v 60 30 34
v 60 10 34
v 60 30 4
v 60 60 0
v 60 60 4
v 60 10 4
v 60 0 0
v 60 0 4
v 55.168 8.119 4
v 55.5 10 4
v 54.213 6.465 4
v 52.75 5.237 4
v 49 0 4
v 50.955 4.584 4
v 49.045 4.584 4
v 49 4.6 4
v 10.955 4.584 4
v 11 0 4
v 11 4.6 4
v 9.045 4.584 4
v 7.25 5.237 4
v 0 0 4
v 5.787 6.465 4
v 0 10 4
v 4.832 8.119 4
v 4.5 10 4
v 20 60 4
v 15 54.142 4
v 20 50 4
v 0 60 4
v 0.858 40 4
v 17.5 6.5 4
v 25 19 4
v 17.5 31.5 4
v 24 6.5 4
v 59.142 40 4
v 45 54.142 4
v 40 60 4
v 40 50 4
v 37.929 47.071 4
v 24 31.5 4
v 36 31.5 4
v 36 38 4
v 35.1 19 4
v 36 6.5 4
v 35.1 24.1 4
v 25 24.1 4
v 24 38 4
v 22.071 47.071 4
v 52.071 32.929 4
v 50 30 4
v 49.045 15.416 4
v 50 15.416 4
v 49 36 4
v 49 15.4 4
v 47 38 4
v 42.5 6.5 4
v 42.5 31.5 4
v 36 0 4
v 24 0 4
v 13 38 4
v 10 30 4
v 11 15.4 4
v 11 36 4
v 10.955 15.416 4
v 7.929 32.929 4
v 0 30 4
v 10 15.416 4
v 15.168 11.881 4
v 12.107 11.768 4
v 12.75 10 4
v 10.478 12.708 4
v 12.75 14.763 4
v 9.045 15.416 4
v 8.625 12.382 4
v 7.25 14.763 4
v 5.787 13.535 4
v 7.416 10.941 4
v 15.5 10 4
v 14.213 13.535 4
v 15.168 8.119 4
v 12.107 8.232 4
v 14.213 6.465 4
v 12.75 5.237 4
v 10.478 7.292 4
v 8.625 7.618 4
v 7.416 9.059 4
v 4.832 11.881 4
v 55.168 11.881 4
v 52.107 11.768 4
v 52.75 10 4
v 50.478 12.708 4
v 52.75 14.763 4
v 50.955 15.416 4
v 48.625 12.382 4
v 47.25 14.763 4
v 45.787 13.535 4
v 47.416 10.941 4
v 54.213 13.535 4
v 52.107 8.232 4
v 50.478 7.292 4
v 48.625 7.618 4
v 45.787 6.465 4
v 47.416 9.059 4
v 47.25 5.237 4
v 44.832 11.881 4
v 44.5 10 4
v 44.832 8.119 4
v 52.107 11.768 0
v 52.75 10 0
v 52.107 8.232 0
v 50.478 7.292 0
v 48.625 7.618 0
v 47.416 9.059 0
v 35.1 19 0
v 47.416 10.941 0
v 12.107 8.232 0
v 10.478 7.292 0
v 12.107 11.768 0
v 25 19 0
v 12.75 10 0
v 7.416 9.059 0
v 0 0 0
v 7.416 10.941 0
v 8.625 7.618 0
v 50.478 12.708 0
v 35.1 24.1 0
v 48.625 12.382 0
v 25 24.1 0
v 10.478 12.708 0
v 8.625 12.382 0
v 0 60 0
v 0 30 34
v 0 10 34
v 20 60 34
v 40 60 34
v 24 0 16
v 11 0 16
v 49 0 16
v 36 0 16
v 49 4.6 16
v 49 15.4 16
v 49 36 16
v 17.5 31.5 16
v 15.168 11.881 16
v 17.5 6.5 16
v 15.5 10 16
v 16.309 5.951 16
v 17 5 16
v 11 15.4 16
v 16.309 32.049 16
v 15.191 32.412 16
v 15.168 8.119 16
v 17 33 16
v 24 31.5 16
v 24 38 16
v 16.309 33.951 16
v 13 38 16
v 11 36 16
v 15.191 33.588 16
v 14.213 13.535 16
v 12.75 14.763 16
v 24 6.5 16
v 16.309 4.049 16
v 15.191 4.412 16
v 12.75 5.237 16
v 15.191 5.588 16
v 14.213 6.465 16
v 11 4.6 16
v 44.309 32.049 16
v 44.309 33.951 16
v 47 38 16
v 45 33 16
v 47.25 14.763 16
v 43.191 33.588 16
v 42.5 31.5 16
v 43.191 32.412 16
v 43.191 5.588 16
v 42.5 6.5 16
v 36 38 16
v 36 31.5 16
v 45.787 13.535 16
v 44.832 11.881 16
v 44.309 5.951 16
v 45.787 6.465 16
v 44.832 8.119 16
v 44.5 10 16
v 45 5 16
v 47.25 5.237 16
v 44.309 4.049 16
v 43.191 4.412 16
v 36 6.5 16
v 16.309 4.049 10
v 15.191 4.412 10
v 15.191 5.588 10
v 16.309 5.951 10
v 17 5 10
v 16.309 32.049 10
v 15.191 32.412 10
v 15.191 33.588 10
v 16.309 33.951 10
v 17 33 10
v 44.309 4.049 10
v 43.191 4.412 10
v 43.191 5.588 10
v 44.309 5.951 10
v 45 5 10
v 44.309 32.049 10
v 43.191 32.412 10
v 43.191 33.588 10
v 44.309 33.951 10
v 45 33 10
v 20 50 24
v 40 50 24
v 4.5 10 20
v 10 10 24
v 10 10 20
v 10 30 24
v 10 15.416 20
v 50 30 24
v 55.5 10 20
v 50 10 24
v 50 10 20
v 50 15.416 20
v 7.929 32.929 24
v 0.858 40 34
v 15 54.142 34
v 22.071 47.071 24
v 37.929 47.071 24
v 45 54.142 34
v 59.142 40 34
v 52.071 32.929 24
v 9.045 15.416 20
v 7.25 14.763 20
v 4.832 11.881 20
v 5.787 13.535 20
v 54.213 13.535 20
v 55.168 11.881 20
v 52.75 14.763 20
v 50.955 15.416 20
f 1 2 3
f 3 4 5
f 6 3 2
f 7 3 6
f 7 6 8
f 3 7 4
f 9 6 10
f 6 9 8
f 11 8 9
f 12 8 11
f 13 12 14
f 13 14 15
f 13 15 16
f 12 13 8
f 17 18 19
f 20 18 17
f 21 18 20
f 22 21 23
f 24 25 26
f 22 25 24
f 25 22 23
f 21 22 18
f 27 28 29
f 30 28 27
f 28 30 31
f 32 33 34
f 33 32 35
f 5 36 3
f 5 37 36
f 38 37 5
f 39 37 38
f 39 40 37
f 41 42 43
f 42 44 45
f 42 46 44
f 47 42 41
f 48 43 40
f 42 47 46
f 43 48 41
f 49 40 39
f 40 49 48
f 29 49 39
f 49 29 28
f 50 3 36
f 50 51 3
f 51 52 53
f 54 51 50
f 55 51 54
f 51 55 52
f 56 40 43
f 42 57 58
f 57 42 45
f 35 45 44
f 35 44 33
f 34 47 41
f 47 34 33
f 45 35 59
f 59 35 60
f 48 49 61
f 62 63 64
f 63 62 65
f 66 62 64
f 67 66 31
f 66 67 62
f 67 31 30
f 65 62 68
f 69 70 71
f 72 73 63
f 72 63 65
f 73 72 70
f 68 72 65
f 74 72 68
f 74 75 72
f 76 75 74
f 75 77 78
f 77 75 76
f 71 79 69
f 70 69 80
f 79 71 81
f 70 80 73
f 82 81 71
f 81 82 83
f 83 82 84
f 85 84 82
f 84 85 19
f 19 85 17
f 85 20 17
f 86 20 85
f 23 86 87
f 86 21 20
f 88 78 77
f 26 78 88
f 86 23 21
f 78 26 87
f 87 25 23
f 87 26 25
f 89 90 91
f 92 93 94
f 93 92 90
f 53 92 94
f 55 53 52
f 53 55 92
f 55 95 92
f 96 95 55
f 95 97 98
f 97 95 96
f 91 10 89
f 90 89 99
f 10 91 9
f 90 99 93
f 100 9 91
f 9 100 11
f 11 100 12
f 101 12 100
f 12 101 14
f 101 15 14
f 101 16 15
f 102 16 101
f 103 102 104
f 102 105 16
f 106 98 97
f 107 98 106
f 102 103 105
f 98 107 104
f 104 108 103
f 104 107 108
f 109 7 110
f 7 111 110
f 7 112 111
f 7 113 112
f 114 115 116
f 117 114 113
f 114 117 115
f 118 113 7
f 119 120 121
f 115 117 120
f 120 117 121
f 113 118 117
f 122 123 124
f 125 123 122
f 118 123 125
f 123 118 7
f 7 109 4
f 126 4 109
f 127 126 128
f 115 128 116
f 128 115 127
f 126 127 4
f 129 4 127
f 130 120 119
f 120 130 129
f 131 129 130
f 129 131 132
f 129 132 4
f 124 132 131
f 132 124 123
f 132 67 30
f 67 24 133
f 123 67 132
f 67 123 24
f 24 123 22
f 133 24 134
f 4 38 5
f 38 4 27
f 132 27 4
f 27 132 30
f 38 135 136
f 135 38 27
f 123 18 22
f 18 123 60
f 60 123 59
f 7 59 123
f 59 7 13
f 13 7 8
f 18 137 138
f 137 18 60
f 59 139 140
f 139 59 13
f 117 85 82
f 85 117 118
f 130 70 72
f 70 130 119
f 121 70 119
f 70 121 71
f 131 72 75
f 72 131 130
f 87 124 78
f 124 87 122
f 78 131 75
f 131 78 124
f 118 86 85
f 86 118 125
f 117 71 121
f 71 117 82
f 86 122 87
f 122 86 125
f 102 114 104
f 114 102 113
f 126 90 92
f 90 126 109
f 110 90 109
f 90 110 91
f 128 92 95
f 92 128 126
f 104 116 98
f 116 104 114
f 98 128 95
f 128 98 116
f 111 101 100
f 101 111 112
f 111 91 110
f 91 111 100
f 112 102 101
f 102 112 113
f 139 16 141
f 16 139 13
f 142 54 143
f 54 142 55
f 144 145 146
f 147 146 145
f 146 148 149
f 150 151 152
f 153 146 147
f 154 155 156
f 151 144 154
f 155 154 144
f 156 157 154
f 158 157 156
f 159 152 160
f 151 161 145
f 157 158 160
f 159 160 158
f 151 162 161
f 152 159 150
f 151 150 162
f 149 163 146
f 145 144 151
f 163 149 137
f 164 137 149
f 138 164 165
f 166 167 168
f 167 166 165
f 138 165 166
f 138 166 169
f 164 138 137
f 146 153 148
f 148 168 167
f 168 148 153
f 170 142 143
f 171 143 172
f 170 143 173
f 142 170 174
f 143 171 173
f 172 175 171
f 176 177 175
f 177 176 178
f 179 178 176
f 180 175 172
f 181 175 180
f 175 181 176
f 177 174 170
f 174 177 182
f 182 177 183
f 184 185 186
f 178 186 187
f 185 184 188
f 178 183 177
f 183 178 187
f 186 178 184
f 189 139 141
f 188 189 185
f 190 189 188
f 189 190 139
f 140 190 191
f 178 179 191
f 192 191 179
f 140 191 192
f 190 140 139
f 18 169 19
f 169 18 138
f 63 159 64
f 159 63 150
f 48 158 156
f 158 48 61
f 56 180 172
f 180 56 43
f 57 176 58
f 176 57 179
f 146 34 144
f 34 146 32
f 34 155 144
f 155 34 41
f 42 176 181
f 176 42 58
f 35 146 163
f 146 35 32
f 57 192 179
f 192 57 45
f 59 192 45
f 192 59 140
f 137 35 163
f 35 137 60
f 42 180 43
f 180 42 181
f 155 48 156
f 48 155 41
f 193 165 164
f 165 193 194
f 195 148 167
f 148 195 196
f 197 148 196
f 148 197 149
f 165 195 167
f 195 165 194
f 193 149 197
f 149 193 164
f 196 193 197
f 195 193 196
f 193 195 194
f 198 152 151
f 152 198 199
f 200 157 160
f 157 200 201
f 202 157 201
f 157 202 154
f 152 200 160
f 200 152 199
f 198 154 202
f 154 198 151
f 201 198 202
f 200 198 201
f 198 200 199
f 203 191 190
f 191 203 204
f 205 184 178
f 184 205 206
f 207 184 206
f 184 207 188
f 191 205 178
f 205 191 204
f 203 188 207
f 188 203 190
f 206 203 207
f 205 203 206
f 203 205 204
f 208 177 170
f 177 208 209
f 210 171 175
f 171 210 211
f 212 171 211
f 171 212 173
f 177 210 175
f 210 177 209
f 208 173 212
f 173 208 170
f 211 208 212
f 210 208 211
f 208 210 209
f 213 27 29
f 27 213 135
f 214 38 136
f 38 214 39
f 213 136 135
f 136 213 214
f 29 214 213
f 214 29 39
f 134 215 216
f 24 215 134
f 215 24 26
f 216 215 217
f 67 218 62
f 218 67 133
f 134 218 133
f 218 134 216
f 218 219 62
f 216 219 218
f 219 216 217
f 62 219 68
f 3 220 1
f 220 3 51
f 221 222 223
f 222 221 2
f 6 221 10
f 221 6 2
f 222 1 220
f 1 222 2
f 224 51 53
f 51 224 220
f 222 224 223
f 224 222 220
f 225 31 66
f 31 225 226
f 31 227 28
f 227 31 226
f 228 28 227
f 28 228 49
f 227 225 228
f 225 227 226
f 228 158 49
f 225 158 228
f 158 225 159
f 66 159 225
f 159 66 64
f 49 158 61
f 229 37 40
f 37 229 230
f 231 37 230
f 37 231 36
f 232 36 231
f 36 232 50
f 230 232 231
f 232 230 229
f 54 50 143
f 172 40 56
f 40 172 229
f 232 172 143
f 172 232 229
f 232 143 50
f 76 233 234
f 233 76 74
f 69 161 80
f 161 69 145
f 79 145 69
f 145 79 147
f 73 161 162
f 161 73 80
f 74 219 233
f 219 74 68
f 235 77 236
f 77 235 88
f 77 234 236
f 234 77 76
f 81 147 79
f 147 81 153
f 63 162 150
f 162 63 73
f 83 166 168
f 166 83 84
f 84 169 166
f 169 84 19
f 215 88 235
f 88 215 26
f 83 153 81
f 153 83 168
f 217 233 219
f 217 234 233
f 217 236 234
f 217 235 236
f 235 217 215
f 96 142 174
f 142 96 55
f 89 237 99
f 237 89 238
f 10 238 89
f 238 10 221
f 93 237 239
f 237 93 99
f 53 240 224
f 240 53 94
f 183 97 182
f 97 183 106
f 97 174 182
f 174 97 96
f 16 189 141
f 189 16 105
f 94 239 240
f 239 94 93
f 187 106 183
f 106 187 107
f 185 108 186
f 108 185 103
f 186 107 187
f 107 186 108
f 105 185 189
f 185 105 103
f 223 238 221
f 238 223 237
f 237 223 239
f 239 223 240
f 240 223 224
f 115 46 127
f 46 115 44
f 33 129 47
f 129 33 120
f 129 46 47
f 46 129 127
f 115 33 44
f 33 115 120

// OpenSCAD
module backMount() {
  difference() {
    // outer box
    cube([38,38,12]);
    //hollow out main hole
    translate([6.5,6.5,-0.1]) cube([25,25,12.2]);
    //notch for cable bottom
    translate([13,-0.1,-0.1]) cube([12,8.2,18.2]);
     //notch for cable top
    translate([13,29.9,-0.1]) cube([12,8.2,18.2]);
    //mounting holes 28mm square
    translate([(19-14),(19-14),6]) cylinder(h=6.1,r=1);
    translate([(19-14),(19+14),6]) cylinder(h=6.1,r=1);
    translate([(19+14),(19-14),6]) cylinder(h=6.1,r=1);
    translate([(19+14),(19+14),6]) cylinder(h=6.1,r=1);
      }
}
module lightWedge() {
    union(){
    translate([0,10,20]) rotate([0,-90,180]) 
    linear_extrude(height=20,center=true,convexity=10,twist=0)
    polygon(points=[[0,0], [10,0], [0,10]],paths=[[0,1,2]]);
        translate([-10,0,0]) cube([20,10,20]);
    }
}
module base() {
    difference() {
        cube([60,60,4]);
        // mounting holes
        translate([10,10,-0.1]) cylinder(h=4.2,r=2.75);
        translate([50,10,-0.1]) cylinder(h=4.2,r=2.75);
    }
}
module lightCamMount(){
    difference() {
    union() {
        base();
        translate([11,0,4]) backMount();
        translate([30,50,4]) lightWedge();
        translate([10,20,4]) rotate(90) lightWedge();
        translate([50,20,4]) rotate(-90) lightWedge();
        translate([15,40,4]) rotate(45) lightWedge();
        translate([45,40,4]) rotate(-45) lightWedge();
    }
    // clearance for screws
        translate([10,10,4]) cylinder(h=16,r=5.5);
        translate([50,10,4]) cylinder(h=16,r=5.5);
    // hole for cable exit
    translate([25,19,-0.1]) cube([10.1,5.1,4.2]);
}
    
}
//backMount();
//lightWedge();
//base();
lightCamMount();
